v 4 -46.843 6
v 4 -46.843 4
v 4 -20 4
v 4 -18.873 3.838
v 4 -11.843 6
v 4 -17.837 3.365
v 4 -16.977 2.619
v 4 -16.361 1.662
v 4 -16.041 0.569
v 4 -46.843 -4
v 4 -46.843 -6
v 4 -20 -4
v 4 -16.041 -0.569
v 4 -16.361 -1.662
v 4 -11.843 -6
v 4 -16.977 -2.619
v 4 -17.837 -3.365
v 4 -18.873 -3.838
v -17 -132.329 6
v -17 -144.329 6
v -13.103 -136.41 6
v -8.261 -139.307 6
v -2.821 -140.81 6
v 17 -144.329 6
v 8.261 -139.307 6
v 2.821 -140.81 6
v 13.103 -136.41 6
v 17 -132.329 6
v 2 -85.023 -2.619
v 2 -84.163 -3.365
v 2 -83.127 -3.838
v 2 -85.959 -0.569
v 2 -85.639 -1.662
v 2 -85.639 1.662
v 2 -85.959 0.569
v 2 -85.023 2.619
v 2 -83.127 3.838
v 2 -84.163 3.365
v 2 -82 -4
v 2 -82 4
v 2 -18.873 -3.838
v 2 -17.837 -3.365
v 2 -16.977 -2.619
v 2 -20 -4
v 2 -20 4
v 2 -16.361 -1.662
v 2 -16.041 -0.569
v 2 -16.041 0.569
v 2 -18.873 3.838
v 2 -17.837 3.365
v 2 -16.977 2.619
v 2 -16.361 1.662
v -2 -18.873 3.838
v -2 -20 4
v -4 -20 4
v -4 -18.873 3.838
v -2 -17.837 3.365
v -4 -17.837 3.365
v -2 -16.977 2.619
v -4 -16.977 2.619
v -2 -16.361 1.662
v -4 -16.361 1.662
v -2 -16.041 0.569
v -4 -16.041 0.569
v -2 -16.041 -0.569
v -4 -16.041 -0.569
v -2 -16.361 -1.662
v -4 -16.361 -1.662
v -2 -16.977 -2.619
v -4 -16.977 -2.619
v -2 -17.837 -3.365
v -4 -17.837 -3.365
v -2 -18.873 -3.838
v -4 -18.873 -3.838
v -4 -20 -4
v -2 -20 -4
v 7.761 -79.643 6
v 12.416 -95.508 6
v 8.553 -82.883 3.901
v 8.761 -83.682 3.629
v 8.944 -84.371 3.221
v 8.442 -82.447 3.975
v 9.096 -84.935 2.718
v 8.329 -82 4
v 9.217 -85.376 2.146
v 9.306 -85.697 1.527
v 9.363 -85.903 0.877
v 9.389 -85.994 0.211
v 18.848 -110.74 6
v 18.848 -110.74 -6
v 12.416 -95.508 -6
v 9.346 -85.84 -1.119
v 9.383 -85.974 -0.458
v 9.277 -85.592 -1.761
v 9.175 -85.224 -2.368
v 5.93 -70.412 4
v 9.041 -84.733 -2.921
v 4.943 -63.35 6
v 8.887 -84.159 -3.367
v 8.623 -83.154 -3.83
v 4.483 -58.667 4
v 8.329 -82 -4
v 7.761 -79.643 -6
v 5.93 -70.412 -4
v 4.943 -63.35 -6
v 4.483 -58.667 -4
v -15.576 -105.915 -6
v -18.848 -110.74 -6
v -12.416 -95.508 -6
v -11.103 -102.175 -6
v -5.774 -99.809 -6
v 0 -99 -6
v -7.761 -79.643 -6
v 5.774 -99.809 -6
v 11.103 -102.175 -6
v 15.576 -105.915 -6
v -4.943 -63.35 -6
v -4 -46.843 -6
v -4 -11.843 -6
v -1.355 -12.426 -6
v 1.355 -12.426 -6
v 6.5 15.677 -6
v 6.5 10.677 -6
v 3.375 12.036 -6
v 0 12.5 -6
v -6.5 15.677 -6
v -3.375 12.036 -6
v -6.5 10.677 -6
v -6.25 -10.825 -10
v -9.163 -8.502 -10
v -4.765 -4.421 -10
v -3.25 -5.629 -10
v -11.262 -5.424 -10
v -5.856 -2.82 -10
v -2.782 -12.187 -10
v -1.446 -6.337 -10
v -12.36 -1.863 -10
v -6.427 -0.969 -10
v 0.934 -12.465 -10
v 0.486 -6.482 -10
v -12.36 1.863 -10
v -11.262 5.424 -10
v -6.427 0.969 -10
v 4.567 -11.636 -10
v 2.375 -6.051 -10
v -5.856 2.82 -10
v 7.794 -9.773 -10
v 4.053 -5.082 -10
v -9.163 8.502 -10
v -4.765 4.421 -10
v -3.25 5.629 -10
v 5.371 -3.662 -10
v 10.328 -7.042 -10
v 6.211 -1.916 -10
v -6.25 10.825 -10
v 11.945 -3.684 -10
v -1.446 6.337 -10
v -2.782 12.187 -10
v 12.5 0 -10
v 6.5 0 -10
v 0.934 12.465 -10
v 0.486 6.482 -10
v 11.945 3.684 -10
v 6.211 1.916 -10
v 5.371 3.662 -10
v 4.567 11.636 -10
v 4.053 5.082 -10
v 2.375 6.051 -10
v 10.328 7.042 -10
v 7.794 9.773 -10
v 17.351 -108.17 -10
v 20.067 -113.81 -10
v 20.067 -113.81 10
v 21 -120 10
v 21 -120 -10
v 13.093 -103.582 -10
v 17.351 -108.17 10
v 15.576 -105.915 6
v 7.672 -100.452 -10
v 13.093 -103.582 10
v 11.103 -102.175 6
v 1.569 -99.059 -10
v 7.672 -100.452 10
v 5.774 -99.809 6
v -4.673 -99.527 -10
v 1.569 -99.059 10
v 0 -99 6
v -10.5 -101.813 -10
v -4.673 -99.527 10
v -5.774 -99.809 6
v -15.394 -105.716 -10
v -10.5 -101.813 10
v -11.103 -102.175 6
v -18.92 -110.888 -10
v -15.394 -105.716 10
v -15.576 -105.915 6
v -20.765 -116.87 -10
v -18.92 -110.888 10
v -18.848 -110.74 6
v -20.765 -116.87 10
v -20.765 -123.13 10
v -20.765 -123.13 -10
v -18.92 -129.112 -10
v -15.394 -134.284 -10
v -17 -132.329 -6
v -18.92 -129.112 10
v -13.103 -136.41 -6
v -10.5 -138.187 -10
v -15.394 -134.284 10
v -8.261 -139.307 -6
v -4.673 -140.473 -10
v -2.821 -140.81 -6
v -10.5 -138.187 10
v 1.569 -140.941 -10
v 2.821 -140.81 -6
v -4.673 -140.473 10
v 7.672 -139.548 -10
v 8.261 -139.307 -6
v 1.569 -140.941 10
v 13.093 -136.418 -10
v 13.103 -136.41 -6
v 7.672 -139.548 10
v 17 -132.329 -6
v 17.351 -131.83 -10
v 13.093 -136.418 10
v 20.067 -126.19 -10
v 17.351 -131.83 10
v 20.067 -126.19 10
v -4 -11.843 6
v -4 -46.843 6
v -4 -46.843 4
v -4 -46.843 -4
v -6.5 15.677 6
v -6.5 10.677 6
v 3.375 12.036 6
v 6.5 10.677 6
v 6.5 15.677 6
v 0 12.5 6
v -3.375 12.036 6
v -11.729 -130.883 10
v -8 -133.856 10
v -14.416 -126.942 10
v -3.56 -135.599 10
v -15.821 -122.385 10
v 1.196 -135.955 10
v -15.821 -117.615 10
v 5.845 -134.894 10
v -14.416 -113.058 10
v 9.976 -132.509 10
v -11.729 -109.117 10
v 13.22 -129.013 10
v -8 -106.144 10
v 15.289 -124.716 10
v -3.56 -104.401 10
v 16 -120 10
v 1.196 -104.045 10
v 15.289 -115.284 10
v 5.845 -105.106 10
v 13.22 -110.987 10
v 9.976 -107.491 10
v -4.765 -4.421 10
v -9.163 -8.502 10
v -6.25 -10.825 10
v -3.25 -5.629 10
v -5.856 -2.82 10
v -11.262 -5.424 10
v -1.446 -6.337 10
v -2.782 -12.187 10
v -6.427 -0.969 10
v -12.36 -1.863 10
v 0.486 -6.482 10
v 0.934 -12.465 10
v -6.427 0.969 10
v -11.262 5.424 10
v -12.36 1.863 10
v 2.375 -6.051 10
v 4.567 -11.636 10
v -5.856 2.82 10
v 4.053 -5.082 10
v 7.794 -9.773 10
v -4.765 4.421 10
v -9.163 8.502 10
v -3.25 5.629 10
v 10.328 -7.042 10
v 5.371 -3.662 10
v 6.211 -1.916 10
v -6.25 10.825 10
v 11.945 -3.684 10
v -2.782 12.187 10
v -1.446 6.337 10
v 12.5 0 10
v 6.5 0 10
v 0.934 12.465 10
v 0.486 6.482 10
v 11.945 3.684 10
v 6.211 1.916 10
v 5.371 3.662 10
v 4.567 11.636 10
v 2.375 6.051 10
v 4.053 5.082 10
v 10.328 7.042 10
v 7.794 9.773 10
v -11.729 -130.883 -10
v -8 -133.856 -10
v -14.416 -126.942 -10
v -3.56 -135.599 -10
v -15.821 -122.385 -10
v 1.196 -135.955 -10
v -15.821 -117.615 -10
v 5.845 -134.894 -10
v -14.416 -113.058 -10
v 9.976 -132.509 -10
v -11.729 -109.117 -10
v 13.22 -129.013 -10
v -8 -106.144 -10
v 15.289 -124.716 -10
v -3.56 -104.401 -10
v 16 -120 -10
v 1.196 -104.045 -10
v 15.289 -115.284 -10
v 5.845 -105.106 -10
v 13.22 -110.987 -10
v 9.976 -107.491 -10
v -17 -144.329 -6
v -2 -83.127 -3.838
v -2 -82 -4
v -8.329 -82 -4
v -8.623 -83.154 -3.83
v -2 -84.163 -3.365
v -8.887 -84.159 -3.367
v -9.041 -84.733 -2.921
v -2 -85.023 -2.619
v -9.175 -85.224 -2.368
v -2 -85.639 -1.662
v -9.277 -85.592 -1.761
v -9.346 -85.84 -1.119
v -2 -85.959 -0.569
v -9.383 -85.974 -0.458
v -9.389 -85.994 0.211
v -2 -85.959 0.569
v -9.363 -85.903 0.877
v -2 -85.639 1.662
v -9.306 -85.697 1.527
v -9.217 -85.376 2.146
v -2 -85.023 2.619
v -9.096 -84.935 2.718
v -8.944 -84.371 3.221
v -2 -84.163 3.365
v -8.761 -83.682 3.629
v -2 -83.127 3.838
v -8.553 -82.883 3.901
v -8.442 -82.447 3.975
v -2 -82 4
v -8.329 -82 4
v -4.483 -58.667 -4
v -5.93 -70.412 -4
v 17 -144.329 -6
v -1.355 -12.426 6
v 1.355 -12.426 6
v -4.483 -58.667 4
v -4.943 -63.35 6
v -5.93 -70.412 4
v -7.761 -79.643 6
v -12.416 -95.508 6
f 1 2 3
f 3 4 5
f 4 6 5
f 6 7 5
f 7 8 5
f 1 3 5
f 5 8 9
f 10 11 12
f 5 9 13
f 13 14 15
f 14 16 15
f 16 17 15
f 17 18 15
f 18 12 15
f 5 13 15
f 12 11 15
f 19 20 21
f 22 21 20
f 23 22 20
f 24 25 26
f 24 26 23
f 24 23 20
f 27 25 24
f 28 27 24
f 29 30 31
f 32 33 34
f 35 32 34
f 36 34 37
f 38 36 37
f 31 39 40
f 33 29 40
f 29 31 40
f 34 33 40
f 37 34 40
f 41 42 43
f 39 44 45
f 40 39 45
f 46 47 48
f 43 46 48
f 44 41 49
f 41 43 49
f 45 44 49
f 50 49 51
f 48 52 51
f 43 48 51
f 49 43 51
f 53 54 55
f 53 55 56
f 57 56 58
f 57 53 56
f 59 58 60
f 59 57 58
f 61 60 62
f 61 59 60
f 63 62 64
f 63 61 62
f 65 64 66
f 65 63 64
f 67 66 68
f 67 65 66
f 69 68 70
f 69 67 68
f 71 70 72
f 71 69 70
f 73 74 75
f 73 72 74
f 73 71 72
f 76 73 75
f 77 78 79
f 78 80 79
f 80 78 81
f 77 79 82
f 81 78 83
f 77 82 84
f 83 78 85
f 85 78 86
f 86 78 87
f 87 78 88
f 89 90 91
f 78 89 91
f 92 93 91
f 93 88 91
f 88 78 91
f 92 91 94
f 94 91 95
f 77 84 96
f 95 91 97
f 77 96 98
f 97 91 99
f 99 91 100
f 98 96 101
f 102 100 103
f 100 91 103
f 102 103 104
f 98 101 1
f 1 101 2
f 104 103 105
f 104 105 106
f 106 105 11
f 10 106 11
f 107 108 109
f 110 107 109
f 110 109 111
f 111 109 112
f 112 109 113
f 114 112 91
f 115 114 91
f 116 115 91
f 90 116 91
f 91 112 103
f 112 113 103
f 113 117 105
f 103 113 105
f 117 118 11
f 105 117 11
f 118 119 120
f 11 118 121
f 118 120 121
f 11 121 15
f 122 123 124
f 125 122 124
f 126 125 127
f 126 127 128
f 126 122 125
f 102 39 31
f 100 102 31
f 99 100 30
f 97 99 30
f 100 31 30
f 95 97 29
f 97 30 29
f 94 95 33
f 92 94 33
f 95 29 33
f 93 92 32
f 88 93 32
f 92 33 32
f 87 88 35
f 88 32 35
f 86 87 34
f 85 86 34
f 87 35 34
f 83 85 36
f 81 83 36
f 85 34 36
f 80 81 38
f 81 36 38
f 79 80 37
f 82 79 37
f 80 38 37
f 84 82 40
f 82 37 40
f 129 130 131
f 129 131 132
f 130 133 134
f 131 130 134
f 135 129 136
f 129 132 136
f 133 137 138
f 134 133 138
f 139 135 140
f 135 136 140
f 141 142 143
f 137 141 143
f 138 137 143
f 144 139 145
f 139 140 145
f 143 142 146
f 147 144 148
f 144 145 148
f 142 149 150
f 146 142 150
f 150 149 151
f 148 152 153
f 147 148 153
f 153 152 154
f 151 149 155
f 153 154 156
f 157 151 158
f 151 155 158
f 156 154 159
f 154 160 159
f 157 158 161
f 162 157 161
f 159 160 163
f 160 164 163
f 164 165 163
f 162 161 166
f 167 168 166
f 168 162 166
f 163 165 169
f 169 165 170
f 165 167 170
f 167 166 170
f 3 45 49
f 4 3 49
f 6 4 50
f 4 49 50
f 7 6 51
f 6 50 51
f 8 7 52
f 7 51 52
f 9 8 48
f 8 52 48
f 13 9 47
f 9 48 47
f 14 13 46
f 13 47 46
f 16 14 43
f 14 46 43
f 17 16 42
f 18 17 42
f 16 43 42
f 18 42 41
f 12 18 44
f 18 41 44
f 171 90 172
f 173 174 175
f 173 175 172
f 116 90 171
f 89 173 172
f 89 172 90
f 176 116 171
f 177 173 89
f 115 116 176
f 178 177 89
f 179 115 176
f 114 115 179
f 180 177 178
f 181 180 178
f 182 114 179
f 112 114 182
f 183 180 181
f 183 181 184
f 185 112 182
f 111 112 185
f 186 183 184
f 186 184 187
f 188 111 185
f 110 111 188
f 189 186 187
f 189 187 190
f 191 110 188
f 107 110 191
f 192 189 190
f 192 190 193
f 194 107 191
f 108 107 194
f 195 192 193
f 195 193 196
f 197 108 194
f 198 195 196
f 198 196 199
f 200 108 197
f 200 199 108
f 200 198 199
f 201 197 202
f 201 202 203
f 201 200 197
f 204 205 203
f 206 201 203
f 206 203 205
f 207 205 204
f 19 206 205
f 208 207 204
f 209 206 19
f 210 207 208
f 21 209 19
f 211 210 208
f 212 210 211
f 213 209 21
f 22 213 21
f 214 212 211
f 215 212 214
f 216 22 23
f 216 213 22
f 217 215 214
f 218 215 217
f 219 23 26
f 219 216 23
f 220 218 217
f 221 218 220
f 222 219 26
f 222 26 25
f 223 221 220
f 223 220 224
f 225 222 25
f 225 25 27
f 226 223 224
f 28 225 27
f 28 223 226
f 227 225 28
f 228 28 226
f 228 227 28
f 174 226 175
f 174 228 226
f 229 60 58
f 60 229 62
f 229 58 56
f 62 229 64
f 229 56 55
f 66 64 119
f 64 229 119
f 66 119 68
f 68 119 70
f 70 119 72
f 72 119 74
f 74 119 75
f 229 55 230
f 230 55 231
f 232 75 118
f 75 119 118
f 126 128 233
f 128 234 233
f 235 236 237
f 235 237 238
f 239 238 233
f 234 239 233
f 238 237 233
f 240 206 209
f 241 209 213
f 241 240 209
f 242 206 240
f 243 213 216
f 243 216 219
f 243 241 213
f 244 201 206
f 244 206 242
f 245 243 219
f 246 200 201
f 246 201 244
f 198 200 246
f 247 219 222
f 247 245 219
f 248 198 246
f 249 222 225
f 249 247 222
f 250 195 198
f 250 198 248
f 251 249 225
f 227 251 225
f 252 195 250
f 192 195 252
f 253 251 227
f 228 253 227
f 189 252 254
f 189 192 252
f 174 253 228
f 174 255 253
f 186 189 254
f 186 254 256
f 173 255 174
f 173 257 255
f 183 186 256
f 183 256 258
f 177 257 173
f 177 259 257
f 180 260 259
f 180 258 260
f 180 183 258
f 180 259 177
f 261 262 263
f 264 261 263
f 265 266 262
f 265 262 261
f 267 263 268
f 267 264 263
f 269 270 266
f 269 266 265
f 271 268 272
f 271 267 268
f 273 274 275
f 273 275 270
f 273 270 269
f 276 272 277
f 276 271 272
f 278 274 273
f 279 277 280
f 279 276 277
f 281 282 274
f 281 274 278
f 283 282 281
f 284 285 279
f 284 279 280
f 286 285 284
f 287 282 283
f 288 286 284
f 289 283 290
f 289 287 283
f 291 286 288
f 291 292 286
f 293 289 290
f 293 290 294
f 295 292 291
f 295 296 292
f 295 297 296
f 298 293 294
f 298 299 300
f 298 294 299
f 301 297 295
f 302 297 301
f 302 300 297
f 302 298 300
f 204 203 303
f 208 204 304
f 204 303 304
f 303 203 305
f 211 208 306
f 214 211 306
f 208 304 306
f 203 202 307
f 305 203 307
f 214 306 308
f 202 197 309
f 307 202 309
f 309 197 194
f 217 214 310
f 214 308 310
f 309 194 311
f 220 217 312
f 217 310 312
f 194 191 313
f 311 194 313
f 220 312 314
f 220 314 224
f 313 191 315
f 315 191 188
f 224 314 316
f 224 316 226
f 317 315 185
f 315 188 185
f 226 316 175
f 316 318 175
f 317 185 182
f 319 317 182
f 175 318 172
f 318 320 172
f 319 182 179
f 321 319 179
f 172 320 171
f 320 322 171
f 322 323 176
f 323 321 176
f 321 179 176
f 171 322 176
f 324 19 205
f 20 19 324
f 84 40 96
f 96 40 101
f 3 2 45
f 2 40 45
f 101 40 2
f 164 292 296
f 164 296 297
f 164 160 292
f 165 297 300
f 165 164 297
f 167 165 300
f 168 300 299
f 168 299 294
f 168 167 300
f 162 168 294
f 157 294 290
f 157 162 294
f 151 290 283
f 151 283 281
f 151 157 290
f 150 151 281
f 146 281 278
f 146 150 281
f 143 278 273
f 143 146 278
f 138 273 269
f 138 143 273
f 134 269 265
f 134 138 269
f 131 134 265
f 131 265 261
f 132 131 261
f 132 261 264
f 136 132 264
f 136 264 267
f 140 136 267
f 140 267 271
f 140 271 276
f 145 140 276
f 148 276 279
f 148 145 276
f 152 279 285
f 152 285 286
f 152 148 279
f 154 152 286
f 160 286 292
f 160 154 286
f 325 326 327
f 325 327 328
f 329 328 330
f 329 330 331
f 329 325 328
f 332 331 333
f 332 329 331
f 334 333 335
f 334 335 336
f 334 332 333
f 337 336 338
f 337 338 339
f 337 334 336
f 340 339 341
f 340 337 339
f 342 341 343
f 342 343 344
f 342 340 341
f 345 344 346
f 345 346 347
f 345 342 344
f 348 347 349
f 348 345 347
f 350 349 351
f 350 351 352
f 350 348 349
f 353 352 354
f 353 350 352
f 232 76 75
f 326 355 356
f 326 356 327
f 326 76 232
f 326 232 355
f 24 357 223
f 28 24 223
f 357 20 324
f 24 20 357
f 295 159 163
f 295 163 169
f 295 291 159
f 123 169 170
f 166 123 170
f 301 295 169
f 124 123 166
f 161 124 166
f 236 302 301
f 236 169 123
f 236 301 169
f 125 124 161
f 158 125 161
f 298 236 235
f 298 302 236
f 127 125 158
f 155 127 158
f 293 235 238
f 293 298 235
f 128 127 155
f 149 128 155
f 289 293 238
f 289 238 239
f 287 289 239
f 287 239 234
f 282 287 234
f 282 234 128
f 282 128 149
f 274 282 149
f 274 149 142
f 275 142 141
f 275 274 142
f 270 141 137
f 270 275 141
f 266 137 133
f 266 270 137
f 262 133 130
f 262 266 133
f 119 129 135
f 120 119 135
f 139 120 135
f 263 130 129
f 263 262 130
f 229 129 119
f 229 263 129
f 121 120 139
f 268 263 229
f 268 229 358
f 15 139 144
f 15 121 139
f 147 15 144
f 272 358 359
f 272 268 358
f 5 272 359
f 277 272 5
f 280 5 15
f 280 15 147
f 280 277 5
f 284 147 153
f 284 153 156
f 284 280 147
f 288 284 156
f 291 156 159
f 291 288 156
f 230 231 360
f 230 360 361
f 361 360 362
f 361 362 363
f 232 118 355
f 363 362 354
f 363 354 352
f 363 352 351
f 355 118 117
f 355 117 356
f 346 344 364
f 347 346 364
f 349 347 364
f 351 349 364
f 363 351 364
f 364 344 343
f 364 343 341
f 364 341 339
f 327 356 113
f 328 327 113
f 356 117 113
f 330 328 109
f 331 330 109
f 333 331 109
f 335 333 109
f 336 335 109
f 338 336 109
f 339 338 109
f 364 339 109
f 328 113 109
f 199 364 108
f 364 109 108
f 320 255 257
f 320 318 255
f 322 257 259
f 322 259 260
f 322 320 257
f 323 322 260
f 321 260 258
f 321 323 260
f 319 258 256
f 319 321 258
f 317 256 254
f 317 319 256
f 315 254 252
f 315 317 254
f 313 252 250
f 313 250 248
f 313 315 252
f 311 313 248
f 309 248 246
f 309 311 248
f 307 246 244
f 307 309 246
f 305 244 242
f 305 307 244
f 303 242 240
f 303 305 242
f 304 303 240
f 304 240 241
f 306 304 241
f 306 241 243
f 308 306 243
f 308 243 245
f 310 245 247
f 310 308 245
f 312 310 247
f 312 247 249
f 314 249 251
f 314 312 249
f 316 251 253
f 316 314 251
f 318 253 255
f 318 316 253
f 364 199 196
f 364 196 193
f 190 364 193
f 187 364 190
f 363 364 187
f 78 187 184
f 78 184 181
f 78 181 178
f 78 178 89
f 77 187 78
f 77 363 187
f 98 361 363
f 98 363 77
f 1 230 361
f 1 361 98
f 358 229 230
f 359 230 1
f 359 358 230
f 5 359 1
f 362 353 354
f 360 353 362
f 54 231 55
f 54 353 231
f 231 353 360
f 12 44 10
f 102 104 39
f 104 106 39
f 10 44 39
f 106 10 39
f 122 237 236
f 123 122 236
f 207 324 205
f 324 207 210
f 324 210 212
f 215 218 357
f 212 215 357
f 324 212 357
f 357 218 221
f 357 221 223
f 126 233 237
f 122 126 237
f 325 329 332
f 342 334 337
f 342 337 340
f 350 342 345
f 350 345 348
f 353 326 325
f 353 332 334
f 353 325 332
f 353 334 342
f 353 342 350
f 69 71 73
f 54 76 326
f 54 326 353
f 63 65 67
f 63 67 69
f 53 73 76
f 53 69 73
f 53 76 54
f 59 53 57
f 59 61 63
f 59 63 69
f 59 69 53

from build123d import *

# Parameters (mm, degrees)
SKETCH1_R             = 12.5
SKETCH1_R_2           = 6.5
BOSS_EXTRUDE2_DEPTH   = 10
SKETCH1_R_3           = 21
SKETCH1_R_4           = 16
BOSS_EXTRUDE2_2_DEPTH = 10
BOSS_EXTRUDE3_DEPTH   = 6
BOSS_EXTRUDE4_DEPTH   = 6
CUT_EXTRUDE1_START    = -6
CUT_EXTRUDE1_DEPTH    = 141.818972185
CUT_EXTRUDE6_START    = -2
CUT_EXTRUDE6_DEPTH    = 149.818972185


with BuildPart() as part:
    # Sketch1 → Boss-Extrude2 (new, symmetric)
    with BuildSketch(Plane.XY):
        Circle(SKETCH1_R)
        Circle(SKETCH1_R_2, mode=Mode.SUBTRACT)
    extrude(amount=BOSS_EXTRUDE2_DEPTH, both=True)



with BuildPart() as body_2:
    # Sketch1 → Boss-Extrude2 2 (new, symmetric)
    with BuildSketch(Plane.XY):
        with Locations((0, -120)):
            Circle(SKETCH1_R_3)
        with Locations((0, -120)):
            Circle(SKETCH1_R_4, mode=Mode.SUBTRACT)
    extrude(amount=BOSS_EXTRUDE2_2_DEPTH, both=True)


with BuildPart() as part_1:
    add(part.part)

    add(body_2.part)  # Boss-Extrude3 merges body 2
    # Sketch1<6> → Boss-Extrude3 (add, symmetric)
    with BuildSketch(Plane.XY):
        with BuildLine():
            ThreePointArc((4, -11.842719282), (0, -12.5), (-4, -11.842719282))
            Line((-4, -11.842719282), (-4, -46.842719282))
            ThreePointArc((-4, -46.842719282), (-7.760864887, -79.642724072), (-18.848249172, -110.740221215))
            ThreePointArc((-18.848249172, -110.740221215), (0, -99), (18.848249172, -110.740221215))
            ThreePointArc((18.848249172, -110.740221215), (7.760864887, -79.642724072), (4, -46.842719282))
            Line((4, -46.842719282), (4, -11.842719282))
        make_face()
        with BuildLine():
            ThreePointArc((17, -132.328828006), (0, -141), (-17, -132.328828006))
            Line((-17, -132.328828006), (-17, -144.328828006))
            Line((-17, -144.328828006), (17, -144.328828006))
            Line((17, -144.328828006), (17, -132.328828006))
        make_face()
    extrude(amount=BOSS_EXTRUDE3_DEPTH, both=True)

    # Sketch2 → Boss-Extrude4 (add, symmetric)
    with BuildSketch(Plane.XY):
        with BuildLine():
            Line((6.5, 15.677078252), (6.5, 10.677078252))
            ThreePointArc((6.5, 10.677078252), (0, 12.5), (-6.5, 10.677078252))
            Line((-6.5, 10.677078252), (-6.5, 15.677078252))
            Line((-6.5, 15.677078252), (6.5, 15.677078252))
        make_face()
    extrude(amount=BOSS_EXTRUDE4_DEPTH, both=True)

    # Sketch3 → Cut-Extrude1 (cut, through all)
    with BuildSketch(Plane(origin=(4, 0, 0), x_dir=(0, 0, -1), z_dir=(1, 0, 0)).offset(CUT_EXTRUDE1_START)):
        with BuildLine():
            Line((-4, -82), (-4, -20))
            ThreePointArc((-4, -20), (0, -16), (4, -20))
            Line((4, -20), (4, -82))
            ThreePointArc((4, -82), (0, -86), (-4, -82))
        make_face()
    extrude(amount=-CUT_EXTRUDE1_DEPTH, mode=Mode.SUBTRACT)

    # Sketch3<5> → Cut-Extrude6 (cut, through all)
    with BuildSketch(Plane(origin=(4, 0, 0), x_dir=(0, 0, -1), z_dir=(1, 0, 0)).offset(CUT_EXTRUDE6_START)):
        with BuildLine():
            Line((-4, -82), (-4, -20))
            ThreePointArc((-4, -20), (0, -16), (4, -20))
            Line((4, -20), (4, -82))
            ThreePointArc((4, -82), (0, -86), (-4, -82))
        make_face()
    extrude(amount=CUT_EXTRUDE6_DEPTH, mode=Mode.SUBTRACT)


solid = part_1.part
